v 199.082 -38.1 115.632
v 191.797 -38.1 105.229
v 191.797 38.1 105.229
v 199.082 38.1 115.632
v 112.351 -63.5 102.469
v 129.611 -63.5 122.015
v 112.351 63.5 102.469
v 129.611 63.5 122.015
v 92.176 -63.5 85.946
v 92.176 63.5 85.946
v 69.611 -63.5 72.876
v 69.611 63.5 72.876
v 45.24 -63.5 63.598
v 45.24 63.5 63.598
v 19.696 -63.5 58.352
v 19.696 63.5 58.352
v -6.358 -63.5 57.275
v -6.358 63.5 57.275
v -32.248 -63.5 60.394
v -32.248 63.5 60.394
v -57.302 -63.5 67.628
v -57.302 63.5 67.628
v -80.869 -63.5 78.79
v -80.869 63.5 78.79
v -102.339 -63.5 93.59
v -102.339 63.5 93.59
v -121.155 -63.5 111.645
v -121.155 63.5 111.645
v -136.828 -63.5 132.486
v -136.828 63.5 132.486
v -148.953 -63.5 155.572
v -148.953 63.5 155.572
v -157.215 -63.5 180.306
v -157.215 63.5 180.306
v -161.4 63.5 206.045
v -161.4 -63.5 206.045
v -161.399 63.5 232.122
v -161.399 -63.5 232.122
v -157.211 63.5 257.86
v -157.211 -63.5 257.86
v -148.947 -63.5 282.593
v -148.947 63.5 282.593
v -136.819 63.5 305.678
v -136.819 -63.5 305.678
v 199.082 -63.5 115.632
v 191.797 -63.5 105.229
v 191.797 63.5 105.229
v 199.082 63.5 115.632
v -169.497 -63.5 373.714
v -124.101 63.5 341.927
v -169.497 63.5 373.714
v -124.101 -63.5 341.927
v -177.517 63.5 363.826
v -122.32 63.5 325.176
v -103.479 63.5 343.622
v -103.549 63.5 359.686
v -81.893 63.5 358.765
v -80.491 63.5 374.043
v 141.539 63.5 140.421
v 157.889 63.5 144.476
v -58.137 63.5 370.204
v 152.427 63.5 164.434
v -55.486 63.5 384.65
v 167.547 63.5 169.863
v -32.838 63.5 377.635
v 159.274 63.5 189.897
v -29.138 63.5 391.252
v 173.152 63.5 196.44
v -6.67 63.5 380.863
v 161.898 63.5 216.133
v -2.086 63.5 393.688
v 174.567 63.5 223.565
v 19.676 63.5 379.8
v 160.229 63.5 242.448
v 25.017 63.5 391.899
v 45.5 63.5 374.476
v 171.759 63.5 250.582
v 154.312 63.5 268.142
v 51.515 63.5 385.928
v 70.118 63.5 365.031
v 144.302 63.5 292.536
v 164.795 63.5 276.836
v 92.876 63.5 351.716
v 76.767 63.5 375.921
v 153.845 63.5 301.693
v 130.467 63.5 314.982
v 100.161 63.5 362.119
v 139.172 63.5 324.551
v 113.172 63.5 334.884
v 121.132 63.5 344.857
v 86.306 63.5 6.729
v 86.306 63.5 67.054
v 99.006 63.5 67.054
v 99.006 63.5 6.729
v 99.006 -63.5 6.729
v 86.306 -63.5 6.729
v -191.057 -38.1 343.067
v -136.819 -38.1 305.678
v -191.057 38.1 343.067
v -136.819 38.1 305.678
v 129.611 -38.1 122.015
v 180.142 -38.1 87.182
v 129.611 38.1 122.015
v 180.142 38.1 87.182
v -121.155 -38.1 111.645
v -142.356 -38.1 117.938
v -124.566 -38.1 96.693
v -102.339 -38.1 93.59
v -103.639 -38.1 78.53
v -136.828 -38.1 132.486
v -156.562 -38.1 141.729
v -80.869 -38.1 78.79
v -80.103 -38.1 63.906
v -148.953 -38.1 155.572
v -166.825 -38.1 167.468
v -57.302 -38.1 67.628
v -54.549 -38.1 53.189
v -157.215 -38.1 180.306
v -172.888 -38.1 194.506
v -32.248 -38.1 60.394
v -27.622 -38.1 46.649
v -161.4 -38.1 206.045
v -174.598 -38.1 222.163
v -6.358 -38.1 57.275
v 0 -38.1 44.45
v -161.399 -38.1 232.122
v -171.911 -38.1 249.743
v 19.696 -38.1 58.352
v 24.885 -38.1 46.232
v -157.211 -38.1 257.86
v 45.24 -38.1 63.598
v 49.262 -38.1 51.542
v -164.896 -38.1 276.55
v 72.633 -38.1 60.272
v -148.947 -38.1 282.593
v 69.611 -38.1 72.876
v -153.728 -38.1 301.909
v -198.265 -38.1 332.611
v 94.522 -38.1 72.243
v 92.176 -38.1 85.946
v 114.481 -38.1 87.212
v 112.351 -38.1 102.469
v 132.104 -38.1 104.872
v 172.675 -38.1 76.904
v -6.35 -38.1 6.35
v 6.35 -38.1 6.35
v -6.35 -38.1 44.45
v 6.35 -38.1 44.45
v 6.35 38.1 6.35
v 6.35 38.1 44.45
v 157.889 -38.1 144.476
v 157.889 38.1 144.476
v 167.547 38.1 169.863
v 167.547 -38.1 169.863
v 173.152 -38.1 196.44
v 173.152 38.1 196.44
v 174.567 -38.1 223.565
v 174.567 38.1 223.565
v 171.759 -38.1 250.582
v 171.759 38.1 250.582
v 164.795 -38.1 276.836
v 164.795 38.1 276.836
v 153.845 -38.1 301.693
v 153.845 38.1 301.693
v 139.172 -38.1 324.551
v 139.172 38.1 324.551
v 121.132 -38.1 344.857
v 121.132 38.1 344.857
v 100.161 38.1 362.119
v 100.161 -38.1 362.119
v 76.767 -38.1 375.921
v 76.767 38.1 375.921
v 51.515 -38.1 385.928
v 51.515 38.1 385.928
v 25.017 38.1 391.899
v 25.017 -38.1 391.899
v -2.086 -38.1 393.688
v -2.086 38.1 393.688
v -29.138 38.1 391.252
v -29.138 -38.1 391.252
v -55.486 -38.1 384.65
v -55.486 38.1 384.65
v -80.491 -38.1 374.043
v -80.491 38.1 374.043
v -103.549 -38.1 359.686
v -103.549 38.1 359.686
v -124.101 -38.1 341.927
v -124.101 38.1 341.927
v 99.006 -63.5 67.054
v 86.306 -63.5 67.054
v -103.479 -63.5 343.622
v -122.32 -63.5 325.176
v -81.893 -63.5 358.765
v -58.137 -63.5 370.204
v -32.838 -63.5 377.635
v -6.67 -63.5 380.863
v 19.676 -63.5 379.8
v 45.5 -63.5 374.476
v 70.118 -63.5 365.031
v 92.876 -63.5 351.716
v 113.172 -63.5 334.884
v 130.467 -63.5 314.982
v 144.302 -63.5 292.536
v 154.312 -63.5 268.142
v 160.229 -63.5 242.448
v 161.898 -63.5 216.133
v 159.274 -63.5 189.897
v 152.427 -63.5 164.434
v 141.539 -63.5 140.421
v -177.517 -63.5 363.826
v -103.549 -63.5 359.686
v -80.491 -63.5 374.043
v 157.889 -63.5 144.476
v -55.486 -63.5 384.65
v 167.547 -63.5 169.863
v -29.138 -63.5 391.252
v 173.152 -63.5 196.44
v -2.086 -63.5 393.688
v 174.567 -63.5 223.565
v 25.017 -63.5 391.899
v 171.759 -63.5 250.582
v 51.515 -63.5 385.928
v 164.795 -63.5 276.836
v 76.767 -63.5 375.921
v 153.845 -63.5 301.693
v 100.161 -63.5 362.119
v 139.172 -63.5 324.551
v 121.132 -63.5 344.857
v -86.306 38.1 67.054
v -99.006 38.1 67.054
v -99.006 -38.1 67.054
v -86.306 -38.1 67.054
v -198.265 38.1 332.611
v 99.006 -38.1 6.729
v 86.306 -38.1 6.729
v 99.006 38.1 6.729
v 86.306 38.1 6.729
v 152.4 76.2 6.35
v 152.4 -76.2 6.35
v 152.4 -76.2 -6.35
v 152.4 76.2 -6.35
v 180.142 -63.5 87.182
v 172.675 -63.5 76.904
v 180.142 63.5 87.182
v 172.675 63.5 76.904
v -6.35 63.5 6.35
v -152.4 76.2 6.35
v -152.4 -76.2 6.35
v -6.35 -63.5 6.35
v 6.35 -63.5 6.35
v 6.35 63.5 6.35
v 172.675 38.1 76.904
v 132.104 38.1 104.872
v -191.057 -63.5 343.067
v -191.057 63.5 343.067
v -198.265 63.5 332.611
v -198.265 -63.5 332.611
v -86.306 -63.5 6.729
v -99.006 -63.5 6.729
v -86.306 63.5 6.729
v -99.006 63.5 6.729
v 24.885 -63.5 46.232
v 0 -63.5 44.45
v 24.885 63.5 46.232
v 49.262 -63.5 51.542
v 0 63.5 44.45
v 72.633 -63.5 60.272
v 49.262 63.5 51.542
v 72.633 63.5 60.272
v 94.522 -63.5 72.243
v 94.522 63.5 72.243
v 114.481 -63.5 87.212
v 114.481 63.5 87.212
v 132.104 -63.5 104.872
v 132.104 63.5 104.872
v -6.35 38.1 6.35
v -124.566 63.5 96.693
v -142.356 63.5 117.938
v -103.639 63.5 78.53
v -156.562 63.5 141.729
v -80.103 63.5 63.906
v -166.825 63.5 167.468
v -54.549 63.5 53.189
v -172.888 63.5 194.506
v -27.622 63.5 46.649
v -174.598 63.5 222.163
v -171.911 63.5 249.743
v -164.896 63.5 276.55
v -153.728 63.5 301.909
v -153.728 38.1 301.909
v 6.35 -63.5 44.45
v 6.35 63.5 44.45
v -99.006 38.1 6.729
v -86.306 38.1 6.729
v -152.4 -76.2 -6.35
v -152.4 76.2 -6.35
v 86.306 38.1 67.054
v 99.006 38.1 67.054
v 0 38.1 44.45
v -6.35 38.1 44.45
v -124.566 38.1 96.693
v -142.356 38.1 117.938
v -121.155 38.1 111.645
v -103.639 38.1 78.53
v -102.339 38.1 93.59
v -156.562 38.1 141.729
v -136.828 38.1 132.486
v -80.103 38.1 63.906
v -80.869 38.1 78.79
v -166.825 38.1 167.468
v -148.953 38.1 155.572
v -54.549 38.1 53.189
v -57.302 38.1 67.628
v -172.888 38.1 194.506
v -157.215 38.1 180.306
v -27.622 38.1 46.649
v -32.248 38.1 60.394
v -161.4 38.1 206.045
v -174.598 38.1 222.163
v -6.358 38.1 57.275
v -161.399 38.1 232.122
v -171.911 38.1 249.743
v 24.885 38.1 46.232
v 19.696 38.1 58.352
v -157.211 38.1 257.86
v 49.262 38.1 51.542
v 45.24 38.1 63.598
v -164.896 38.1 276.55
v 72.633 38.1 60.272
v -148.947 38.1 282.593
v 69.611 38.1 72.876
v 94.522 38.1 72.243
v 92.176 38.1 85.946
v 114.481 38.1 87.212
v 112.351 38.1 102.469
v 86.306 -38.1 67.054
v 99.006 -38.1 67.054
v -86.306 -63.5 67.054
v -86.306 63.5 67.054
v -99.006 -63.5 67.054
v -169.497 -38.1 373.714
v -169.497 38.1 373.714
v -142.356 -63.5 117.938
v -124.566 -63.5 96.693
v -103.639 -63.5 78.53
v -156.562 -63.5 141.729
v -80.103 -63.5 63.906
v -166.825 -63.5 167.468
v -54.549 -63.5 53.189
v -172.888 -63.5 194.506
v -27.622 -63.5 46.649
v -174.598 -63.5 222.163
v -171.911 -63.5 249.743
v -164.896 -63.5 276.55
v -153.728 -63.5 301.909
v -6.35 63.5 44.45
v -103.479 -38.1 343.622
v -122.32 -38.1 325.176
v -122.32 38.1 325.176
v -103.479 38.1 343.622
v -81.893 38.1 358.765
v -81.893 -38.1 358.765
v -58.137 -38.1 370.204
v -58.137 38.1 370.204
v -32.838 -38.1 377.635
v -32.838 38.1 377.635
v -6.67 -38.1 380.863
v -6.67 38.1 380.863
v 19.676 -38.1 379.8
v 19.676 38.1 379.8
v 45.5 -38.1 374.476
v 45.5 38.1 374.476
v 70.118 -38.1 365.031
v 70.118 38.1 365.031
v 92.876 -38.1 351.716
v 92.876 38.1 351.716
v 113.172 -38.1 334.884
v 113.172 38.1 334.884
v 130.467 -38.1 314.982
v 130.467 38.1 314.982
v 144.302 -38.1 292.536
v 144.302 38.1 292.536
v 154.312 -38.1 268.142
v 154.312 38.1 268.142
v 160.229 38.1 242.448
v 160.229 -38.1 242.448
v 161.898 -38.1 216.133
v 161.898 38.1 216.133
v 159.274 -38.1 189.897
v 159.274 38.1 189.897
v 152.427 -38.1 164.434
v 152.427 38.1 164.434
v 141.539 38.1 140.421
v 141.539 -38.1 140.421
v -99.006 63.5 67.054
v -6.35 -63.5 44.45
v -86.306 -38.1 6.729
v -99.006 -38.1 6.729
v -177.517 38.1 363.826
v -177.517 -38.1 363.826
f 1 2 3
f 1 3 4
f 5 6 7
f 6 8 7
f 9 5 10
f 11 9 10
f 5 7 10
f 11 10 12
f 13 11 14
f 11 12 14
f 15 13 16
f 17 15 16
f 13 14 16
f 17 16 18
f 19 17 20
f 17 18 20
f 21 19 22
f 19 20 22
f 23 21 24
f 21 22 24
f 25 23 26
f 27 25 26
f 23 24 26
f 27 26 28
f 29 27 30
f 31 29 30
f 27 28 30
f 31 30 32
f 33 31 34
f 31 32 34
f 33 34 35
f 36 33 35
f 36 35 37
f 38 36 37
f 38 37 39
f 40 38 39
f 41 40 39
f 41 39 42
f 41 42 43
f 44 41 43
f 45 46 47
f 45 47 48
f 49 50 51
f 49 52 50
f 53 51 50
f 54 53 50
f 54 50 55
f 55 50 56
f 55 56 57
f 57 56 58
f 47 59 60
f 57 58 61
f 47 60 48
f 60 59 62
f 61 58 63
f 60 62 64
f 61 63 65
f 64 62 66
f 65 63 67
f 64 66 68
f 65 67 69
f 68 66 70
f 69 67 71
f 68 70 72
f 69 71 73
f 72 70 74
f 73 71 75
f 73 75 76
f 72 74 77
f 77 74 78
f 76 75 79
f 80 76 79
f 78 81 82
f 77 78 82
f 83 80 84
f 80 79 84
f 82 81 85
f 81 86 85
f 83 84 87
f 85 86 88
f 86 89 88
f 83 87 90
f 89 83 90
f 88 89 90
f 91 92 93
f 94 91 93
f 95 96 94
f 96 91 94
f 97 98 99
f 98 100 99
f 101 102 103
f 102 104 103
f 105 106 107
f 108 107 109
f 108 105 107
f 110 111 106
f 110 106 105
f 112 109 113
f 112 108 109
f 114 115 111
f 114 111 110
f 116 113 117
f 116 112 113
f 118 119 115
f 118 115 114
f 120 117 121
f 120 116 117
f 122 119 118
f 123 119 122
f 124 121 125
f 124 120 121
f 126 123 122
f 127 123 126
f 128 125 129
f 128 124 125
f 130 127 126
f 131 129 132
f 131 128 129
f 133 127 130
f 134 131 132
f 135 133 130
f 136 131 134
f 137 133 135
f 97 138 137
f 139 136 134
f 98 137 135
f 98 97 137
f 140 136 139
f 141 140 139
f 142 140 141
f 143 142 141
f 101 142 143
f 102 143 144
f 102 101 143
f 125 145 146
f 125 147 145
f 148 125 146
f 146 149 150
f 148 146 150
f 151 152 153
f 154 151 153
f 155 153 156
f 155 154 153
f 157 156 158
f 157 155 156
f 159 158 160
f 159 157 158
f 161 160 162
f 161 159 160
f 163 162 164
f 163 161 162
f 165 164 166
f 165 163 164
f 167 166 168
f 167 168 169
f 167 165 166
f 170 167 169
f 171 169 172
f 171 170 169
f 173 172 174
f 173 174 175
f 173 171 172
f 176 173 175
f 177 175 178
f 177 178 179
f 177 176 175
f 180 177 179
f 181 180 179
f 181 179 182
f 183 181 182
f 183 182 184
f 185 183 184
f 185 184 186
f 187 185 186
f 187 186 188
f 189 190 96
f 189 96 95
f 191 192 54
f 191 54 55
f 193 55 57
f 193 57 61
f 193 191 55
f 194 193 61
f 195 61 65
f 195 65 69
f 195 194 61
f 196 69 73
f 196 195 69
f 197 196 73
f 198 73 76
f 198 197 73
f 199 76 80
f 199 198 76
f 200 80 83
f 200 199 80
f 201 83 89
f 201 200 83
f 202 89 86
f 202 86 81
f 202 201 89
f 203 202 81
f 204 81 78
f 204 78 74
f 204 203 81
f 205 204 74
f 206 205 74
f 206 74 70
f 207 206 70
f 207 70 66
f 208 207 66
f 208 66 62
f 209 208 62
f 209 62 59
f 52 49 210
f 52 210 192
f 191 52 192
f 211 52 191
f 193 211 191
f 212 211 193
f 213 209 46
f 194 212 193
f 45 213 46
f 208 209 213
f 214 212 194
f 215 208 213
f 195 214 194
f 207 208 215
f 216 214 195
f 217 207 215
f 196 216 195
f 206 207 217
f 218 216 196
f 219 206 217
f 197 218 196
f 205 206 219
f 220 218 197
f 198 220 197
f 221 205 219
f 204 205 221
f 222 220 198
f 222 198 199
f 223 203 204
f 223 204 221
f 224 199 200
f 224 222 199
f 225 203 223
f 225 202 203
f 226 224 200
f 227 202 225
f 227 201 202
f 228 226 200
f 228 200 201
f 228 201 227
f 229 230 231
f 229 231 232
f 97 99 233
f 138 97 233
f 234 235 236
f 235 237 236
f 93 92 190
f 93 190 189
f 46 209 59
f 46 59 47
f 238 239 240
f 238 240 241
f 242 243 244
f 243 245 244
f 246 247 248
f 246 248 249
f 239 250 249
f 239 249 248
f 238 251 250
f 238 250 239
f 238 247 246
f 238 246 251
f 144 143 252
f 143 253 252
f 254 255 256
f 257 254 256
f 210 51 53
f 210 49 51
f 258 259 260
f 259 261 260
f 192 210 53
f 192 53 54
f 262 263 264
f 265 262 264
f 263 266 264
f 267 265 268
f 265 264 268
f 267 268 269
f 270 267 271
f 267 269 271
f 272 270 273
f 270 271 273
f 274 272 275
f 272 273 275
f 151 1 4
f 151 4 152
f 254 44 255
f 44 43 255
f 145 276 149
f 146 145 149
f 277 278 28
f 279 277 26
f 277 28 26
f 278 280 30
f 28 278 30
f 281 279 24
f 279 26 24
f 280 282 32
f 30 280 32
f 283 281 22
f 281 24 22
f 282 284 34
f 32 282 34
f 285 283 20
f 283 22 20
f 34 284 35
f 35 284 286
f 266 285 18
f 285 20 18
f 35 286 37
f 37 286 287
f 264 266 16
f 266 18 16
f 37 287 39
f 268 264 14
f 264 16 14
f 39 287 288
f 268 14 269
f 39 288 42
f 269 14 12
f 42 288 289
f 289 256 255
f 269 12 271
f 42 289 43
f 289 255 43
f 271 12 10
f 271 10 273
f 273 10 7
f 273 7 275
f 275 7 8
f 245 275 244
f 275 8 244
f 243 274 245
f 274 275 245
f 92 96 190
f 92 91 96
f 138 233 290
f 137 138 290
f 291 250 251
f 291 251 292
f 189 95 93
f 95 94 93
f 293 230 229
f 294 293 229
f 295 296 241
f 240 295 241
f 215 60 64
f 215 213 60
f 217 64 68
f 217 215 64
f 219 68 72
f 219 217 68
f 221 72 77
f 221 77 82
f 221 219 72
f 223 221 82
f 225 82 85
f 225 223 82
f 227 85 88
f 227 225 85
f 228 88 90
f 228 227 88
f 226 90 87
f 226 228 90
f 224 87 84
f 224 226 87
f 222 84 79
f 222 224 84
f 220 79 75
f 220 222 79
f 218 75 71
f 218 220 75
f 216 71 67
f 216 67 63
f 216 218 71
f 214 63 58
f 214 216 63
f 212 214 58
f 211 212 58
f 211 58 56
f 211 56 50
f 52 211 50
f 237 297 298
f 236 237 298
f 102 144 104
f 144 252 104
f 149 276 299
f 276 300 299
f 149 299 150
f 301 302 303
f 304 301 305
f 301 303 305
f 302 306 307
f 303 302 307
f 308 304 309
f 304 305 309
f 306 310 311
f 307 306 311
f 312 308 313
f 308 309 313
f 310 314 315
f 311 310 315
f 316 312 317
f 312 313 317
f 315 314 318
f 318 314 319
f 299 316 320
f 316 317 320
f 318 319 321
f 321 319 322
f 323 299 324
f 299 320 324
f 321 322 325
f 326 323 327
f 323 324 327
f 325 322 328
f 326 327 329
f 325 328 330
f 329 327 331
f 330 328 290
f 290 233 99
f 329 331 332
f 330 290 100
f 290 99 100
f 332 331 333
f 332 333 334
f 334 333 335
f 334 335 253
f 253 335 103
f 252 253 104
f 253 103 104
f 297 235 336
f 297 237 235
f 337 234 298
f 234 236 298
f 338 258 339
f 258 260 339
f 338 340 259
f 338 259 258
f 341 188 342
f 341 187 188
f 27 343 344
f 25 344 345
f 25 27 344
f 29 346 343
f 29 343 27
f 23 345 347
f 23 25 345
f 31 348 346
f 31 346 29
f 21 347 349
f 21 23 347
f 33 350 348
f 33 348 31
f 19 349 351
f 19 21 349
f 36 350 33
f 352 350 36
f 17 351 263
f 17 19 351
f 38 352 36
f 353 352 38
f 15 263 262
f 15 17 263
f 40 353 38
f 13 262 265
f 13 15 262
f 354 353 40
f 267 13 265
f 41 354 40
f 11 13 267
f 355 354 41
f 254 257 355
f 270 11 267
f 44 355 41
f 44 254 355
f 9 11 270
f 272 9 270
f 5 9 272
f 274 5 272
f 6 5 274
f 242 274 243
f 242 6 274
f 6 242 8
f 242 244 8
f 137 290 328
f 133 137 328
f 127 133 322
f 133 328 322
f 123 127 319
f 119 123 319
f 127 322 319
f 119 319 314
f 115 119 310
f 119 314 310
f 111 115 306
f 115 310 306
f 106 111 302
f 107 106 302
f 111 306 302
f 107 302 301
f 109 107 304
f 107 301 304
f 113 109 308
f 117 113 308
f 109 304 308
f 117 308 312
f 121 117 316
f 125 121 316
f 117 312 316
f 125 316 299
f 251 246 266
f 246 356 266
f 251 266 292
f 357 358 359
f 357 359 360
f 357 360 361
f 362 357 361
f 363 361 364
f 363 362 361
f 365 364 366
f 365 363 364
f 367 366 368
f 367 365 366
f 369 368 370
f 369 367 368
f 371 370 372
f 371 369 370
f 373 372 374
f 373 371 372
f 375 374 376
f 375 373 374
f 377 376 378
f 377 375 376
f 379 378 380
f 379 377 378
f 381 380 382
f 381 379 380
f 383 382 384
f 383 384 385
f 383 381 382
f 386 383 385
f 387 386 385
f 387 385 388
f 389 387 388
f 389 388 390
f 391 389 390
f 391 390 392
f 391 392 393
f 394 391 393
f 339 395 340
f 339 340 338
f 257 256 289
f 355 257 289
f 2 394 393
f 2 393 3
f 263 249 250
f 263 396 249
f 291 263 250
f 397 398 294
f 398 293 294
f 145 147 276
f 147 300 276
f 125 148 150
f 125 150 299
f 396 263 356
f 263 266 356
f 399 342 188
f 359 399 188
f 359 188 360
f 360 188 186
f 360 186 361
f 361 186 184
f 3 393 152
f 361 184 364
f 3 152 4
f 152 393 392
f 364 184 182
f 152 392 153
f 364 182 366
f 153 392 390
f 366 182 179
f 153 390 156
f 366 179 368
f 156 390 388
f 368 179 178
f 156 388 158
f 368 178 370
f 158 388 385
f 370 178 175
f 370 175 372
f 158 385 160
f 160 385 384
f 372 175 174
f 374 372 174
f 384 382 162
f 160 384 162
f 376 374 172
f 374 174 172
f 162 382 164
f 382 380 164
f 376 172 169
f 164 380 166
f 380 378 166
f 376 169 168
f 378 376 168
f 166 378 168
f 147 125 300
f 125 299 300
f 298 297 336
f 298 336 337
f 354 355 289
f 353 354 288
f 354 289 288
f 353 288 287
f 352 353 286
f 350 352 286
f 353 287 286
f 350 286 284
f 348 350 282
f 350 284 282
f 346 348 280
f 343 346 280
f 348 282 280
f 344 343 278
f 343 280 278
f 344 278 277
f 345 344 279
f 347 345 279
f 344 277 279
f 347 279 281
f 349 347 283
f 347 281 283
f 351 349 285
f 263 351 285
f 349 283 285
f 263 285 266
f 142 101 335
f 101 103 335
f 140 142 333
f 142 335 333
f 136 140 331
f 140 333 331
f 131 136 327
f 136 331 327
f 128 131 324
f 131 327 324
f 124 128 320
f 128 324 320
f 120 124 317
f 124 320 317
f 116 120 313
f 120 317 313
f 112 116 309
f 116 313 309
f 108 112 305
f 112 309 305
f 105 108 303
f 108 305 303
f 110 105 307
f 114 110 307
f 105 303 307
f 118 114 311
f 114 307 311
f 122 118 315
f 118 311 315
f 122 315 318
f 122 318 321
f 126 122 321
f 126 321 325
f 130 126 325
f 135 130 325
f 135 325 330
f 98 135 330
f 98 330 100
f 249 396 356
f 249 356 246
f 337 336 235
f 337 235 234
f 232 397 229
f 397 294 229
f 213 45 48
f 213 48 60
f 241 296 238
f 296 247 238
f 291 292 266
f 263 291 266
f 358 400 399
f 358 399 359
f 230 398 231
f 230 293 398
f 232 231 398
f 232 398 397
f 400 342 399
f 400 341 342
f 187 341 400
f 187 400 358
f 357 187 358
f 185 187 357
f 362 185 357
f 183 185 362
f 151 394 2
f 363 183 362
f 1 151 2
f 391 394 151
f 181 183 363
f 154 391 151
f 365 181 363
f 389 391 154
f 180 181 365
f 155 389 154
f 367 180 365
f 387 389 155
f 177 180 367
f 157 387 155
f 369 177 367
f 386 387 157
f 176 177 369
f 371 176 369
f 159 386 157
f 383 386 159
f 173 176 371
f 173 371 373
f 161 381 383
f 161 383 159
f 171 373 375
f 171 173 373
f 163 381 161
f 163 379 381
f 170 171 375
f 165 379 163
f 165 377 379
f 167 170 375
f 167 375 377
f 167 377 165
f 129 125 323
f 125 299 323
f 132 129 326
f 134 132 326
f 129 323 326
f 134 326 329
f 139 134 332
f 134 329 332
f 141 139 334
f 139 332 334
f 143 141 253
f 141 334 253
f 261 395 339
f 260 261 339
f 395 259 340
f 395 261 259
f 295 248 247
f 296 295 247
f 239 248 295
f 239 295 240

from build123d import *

# Parameters (mm, degrees)
F0_W     = 304.8
F0_H     = 152.4
F1_DEPTH = 6.35
F2_W     = 12.7
F2_H     = 60.325
F3_DEPTH = 63.5
F4_DEPTH = 38.1


with BuildPart() as f1:
    # F0 (on Top) → F1 (new body, symmetric)
    with BuildSketch(Plane.XY):
        Rectangle(F0_W, F0_H)
    extrude(amount=F1_DEPTH, both=True)

    # F2 (on Front) → F3 (join, symmetric)
    with BuildSketch(Plane.XZ):
        with BuildLine():
            ThreePointArc((-153.72821, 301.909341), (-149.931379, 129.551416), (2e-06, 44.45))
            ThreePointArc((2e-06, 44.45), (72.633137, 60.272235), (132.104141, 104.871731))
            Line((132.104141, 104.871731), (172.674975, 76.904358))
            Line((172.674975, 76.904358), (180.142065, 87.18208))
            Line((180.142065, 87.18208), (129.611379, 122.015245))
            ThreePointArc((129.611379, 122.015245), (-91.902294, 85.757057), (-136.819402, 305.678445))
            Line((-136.819402, 305.678445), (-191.056914, 343.066899))
            Line((-191.056914, 343.066899), (-198.264937, 332.610589))
            Line((-198.264937, 332.610589), (-153.72821, 301.909341))
        make_face()
        Polygon((-6.35, 6.35), (6.35, 6.35), (6.35, 44.45), (2e-06, 44.45), (-6.35, 44.45), align=None)
        with Locations((-92.65634, 36.891353)):
            Rectangle(F2_W, F2_H)
        with Locations((92.65634, 36.891353)):
            Rectangle(F2_W, F2_H)
        with BuildLine():
            Line((-169.497113, 373.713912), (-177.517217, 363.825812))
            Line((-177.517217, 363.825812), (-122.320092, 325.176369))
            ThreePointArc((-122.320092, 325.176369), (92.876364, 351.716195), (141.538609, 140.420517))
            Line((141.538609, 140.420517), (191.797482, 105.228876))
            Line((191.797482, 105.228876), (199.081903, 115.632107))
            Line((199.081903, 115.632107), (157.888755, 144.47586))
            ThreePointArc((157.888755, 144.47586), (100.160785, 362.119426), (-124.101396, 341.927489))
            Line((-124.101396, 341.927489), (-169.497113, 373.713912))
        make_face()
    extrude(amount=F3_DEPTH, both=True)


with BuildPart() as f4:
    # F2 (on Front) → F4 (new body, symmetric)
    with BuildSketch(Plane.XZ):
        with BuildLine():
            ThreePointArc((-153.72821, 301.909341), (-149.931379, 129.551416), (2e-06, 44.45))
            ThreePointArc((2e-06, 44.45), (72.633137, 60.272235), (132.104141, 104.871731))
            Line((132.104141, 104.871731), (172.674975, 76.904358))
            Line((172.674975, 76.904358), (180.142065, 87.18208))
            Line((180.142065, 87.18208), (129.611379, 122.015245))
            ThreePointArc((129.611379, 122.015245), (-91.902294, 85.757057), (-136.819402, 305.678445))
            Line((-136.819402, 305.678445), (-191.056914, 343.066899))
            Line((-191.056914, 343.066899), (-198.264937, 332.610589))
            Line((-198.264937, 332.610589), (-153.72821, 301.909341))
        make_face()
        Polygon((-6.35, 6.35), (6.35, 6.35), (6.35, 44.45), (2e-06, 44.45), (-6.35, 44.45), align=None)
        with Locations((-92.65634, 36.891353)):
            Rectangle(F2_W, F2_H)
        with Locations((92.65634, 36.891353)):
            Rectangle(F2_W, F2_H)
        with BuildLine():
            Line((-169.497113, 373.713912), (-177.517217, 363.825812))
            Line((-177.517217, 363.825812), (-122.320092, 325.176369))
            ThreePointArc((-122.320092, 325.176369), (92.876364, 351.716195), (141.538609, 140.420517))
            Line((141.538609, 140.420517), (191.797482, 105.228876))
            Line((191.797482, 105.228876), (199.081903, 115.632107))
            Line((199.081903, 115.632107), (157.888755, 144.47586))
            ThreePointArc((157.888755, 144.47586), (100.160785, 362.119426), (-124.101396, 341.927489))
            Line((-124.101396, 341.927489), (-169.497113, 373.713912))
        make_face()
    extrude(amount=F4_DEPTH, both=True)


solid = Compound([f1.part, f4.part])
